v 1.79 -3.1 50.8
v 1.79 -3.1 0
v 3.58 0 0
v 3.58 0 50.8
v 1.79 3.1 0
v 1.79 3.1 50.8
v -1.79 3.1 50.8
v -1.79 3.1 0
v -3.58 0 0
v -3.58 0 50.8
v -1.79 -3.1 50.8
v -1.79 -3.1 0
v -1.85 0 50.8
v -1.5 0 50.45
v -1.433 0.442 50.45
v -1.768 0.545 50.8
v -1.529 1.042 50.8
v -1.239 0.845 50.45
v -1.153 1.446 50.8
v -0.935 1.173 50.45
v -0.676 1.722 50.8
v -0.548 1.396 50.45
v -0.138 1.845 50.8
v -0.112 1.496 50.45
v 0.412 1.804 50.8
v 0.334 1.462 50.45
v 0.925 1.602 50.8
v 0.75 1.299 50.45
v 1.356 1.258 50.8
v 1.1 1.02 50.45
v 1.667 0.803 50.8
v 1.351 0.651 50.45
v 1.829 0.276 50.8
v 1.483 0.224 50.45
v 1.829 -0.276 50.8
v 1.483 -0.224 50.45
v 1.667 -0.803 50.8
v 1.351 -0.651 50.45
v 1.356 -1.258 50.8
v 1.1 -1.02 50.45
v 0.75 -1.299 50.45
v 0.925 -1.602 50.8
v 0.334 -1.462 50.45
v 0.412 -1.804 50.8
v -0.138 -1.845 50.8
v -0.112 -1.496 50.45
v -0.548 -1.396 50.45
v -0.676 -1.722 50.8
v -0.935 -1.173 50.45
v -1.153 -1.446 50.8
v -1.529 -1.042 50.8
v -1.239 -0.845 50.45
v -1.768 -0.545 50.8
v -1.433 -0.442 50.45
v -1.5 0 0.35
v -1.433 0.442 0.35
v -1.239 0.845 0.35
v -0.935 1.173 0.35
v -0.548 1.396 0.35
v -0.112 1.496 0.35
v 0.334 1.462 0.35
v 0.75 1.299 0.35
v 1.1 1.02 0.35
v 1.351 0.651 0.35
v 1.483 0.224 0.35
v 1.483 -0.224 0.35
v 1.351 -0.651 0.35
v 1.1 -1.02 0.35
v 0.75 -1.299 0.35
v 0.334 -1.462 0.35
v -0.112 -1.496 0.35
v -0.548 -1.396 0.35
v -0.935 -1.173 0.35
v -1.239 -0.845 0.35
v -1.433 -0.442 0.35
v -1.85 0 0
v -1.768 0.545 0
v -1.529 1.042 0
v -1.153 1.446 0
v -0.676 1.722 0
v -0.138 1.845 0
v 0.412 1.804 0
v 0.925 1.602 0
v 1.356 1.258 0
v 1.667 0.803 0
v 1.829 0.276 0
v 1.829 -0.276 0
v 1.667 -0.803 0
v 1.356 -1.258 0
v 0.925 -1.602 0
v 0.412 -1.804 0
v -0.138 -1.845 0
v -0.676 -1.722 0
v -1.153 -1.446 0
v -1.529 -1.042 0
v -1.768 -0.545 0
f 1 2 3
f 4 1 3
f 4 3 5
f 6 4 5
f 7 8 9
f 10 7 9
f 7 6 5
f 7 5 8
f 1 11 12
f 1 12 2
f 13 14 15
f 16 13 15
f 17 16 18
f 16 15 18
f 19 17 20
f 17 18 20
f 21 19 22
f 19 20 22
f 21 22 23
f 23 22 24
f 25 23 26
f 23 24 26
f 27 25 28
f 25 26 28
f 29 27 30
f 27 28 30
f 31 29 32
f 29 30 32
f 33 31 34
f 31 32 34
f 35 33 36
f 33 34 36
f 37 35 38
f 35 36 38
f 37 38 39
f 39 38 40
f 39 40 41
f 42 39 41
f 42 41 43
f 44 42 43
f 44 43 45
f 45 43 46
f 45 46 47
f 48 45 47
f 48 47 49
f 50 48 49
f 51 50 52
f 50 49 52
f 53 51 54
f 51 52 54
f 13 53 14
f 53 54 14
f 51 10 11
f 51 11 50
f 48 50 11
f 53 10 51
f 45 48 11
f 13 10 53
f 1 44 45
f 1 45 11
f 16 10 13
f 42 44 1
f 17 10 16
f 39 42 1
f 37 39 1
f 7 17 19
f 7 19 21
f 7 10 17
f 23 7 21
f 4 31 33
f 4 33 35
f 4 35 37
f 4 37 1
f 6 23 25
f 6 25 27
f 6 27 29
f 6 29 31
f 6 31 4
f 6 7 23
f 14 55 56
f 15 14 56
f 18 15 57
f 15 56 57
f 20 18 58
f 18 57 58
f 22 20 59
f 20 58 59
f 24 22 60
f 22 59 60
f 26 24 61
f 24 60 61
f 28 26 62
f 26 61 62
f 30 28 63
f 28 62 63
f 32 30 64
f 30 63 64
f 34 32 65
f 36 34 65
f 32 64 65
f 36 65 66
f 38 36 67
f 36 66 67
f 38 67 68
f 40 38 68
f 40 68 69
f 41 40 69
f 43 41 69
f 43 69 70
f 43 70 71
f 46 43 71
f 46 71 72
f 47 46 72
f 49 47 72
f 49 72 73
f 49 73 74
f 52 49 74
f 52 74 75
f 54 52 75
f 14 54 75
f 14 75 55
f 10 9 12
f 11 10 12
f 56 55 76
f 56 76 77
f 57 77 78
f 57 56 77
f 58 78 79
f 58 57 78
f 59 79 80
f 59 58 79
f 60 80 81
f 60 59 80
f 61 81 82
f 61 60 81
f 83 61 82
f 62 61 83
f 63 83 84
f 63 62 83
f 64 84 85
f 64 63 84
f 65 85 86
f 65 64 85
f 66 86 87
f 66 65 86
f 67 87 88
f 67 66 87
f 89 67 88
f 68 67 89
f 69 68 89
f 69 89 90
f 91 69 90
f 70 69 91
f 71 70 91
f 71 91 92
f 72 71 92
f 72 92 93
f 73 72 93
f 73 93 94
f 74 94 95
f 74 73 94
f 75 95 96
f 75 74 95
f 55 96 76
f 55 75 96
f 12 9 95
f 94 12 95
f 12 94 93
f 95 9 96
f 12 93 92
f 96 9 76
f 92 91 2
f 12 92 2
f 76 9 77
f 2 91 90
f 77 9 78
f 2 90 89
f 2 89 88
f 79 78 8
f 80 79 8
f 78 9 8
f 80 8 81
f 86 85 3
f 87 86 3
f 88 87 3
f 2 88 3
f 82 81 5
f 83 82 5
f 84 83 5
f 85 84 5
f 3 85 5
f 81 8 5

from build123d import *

# Parameters (mm, degrees)
BOSS_EXTRUDE1_DEPTH          = 50.8
F_3_0_3_DIAMETER_HOLE1_D     = 3
F_3_0_3_DIAMETER_HOLE1_DEPTH = 50.8
CHAMFER1_SIZE                = 0.35


with BuildPart() as part:
    # Sketch1 → Boss-Extrude1 (new body)
    with BuildSketch(Plane.XY.offset(50.8)):
        Polygon((-3.579571669, 0), (-1.789785834, -3.1), (1.789785834, -3.1), (3.579571669, 0), (1.789785834, 3.1), (-1.789785834, 3.1), align=None)
    extrude(amount=-BOSS_EXTRUDE1_DEPTH)

    # Ø3.0 (3) Diameter Hole1
    with Locations(Plane.XY.offset(50.8)):
        with Locations((0, 0)):
            Hole(F_3_0_3_DIAMETER_HOLE1_D / 2, depth=F_3_0_3_DIAMETER_HOLE1_DEPTH)

    # Chamfer1
    chamfer1_edges = [part.edges().sort_by_distance(p)[0] for p in [
        (1.5, 0, 50.8),
        (1.5, 0, 0),
    ]]
    chamfer(chamfer1_edges, length=CHAMFER1_SIZE)


solid = part.part
